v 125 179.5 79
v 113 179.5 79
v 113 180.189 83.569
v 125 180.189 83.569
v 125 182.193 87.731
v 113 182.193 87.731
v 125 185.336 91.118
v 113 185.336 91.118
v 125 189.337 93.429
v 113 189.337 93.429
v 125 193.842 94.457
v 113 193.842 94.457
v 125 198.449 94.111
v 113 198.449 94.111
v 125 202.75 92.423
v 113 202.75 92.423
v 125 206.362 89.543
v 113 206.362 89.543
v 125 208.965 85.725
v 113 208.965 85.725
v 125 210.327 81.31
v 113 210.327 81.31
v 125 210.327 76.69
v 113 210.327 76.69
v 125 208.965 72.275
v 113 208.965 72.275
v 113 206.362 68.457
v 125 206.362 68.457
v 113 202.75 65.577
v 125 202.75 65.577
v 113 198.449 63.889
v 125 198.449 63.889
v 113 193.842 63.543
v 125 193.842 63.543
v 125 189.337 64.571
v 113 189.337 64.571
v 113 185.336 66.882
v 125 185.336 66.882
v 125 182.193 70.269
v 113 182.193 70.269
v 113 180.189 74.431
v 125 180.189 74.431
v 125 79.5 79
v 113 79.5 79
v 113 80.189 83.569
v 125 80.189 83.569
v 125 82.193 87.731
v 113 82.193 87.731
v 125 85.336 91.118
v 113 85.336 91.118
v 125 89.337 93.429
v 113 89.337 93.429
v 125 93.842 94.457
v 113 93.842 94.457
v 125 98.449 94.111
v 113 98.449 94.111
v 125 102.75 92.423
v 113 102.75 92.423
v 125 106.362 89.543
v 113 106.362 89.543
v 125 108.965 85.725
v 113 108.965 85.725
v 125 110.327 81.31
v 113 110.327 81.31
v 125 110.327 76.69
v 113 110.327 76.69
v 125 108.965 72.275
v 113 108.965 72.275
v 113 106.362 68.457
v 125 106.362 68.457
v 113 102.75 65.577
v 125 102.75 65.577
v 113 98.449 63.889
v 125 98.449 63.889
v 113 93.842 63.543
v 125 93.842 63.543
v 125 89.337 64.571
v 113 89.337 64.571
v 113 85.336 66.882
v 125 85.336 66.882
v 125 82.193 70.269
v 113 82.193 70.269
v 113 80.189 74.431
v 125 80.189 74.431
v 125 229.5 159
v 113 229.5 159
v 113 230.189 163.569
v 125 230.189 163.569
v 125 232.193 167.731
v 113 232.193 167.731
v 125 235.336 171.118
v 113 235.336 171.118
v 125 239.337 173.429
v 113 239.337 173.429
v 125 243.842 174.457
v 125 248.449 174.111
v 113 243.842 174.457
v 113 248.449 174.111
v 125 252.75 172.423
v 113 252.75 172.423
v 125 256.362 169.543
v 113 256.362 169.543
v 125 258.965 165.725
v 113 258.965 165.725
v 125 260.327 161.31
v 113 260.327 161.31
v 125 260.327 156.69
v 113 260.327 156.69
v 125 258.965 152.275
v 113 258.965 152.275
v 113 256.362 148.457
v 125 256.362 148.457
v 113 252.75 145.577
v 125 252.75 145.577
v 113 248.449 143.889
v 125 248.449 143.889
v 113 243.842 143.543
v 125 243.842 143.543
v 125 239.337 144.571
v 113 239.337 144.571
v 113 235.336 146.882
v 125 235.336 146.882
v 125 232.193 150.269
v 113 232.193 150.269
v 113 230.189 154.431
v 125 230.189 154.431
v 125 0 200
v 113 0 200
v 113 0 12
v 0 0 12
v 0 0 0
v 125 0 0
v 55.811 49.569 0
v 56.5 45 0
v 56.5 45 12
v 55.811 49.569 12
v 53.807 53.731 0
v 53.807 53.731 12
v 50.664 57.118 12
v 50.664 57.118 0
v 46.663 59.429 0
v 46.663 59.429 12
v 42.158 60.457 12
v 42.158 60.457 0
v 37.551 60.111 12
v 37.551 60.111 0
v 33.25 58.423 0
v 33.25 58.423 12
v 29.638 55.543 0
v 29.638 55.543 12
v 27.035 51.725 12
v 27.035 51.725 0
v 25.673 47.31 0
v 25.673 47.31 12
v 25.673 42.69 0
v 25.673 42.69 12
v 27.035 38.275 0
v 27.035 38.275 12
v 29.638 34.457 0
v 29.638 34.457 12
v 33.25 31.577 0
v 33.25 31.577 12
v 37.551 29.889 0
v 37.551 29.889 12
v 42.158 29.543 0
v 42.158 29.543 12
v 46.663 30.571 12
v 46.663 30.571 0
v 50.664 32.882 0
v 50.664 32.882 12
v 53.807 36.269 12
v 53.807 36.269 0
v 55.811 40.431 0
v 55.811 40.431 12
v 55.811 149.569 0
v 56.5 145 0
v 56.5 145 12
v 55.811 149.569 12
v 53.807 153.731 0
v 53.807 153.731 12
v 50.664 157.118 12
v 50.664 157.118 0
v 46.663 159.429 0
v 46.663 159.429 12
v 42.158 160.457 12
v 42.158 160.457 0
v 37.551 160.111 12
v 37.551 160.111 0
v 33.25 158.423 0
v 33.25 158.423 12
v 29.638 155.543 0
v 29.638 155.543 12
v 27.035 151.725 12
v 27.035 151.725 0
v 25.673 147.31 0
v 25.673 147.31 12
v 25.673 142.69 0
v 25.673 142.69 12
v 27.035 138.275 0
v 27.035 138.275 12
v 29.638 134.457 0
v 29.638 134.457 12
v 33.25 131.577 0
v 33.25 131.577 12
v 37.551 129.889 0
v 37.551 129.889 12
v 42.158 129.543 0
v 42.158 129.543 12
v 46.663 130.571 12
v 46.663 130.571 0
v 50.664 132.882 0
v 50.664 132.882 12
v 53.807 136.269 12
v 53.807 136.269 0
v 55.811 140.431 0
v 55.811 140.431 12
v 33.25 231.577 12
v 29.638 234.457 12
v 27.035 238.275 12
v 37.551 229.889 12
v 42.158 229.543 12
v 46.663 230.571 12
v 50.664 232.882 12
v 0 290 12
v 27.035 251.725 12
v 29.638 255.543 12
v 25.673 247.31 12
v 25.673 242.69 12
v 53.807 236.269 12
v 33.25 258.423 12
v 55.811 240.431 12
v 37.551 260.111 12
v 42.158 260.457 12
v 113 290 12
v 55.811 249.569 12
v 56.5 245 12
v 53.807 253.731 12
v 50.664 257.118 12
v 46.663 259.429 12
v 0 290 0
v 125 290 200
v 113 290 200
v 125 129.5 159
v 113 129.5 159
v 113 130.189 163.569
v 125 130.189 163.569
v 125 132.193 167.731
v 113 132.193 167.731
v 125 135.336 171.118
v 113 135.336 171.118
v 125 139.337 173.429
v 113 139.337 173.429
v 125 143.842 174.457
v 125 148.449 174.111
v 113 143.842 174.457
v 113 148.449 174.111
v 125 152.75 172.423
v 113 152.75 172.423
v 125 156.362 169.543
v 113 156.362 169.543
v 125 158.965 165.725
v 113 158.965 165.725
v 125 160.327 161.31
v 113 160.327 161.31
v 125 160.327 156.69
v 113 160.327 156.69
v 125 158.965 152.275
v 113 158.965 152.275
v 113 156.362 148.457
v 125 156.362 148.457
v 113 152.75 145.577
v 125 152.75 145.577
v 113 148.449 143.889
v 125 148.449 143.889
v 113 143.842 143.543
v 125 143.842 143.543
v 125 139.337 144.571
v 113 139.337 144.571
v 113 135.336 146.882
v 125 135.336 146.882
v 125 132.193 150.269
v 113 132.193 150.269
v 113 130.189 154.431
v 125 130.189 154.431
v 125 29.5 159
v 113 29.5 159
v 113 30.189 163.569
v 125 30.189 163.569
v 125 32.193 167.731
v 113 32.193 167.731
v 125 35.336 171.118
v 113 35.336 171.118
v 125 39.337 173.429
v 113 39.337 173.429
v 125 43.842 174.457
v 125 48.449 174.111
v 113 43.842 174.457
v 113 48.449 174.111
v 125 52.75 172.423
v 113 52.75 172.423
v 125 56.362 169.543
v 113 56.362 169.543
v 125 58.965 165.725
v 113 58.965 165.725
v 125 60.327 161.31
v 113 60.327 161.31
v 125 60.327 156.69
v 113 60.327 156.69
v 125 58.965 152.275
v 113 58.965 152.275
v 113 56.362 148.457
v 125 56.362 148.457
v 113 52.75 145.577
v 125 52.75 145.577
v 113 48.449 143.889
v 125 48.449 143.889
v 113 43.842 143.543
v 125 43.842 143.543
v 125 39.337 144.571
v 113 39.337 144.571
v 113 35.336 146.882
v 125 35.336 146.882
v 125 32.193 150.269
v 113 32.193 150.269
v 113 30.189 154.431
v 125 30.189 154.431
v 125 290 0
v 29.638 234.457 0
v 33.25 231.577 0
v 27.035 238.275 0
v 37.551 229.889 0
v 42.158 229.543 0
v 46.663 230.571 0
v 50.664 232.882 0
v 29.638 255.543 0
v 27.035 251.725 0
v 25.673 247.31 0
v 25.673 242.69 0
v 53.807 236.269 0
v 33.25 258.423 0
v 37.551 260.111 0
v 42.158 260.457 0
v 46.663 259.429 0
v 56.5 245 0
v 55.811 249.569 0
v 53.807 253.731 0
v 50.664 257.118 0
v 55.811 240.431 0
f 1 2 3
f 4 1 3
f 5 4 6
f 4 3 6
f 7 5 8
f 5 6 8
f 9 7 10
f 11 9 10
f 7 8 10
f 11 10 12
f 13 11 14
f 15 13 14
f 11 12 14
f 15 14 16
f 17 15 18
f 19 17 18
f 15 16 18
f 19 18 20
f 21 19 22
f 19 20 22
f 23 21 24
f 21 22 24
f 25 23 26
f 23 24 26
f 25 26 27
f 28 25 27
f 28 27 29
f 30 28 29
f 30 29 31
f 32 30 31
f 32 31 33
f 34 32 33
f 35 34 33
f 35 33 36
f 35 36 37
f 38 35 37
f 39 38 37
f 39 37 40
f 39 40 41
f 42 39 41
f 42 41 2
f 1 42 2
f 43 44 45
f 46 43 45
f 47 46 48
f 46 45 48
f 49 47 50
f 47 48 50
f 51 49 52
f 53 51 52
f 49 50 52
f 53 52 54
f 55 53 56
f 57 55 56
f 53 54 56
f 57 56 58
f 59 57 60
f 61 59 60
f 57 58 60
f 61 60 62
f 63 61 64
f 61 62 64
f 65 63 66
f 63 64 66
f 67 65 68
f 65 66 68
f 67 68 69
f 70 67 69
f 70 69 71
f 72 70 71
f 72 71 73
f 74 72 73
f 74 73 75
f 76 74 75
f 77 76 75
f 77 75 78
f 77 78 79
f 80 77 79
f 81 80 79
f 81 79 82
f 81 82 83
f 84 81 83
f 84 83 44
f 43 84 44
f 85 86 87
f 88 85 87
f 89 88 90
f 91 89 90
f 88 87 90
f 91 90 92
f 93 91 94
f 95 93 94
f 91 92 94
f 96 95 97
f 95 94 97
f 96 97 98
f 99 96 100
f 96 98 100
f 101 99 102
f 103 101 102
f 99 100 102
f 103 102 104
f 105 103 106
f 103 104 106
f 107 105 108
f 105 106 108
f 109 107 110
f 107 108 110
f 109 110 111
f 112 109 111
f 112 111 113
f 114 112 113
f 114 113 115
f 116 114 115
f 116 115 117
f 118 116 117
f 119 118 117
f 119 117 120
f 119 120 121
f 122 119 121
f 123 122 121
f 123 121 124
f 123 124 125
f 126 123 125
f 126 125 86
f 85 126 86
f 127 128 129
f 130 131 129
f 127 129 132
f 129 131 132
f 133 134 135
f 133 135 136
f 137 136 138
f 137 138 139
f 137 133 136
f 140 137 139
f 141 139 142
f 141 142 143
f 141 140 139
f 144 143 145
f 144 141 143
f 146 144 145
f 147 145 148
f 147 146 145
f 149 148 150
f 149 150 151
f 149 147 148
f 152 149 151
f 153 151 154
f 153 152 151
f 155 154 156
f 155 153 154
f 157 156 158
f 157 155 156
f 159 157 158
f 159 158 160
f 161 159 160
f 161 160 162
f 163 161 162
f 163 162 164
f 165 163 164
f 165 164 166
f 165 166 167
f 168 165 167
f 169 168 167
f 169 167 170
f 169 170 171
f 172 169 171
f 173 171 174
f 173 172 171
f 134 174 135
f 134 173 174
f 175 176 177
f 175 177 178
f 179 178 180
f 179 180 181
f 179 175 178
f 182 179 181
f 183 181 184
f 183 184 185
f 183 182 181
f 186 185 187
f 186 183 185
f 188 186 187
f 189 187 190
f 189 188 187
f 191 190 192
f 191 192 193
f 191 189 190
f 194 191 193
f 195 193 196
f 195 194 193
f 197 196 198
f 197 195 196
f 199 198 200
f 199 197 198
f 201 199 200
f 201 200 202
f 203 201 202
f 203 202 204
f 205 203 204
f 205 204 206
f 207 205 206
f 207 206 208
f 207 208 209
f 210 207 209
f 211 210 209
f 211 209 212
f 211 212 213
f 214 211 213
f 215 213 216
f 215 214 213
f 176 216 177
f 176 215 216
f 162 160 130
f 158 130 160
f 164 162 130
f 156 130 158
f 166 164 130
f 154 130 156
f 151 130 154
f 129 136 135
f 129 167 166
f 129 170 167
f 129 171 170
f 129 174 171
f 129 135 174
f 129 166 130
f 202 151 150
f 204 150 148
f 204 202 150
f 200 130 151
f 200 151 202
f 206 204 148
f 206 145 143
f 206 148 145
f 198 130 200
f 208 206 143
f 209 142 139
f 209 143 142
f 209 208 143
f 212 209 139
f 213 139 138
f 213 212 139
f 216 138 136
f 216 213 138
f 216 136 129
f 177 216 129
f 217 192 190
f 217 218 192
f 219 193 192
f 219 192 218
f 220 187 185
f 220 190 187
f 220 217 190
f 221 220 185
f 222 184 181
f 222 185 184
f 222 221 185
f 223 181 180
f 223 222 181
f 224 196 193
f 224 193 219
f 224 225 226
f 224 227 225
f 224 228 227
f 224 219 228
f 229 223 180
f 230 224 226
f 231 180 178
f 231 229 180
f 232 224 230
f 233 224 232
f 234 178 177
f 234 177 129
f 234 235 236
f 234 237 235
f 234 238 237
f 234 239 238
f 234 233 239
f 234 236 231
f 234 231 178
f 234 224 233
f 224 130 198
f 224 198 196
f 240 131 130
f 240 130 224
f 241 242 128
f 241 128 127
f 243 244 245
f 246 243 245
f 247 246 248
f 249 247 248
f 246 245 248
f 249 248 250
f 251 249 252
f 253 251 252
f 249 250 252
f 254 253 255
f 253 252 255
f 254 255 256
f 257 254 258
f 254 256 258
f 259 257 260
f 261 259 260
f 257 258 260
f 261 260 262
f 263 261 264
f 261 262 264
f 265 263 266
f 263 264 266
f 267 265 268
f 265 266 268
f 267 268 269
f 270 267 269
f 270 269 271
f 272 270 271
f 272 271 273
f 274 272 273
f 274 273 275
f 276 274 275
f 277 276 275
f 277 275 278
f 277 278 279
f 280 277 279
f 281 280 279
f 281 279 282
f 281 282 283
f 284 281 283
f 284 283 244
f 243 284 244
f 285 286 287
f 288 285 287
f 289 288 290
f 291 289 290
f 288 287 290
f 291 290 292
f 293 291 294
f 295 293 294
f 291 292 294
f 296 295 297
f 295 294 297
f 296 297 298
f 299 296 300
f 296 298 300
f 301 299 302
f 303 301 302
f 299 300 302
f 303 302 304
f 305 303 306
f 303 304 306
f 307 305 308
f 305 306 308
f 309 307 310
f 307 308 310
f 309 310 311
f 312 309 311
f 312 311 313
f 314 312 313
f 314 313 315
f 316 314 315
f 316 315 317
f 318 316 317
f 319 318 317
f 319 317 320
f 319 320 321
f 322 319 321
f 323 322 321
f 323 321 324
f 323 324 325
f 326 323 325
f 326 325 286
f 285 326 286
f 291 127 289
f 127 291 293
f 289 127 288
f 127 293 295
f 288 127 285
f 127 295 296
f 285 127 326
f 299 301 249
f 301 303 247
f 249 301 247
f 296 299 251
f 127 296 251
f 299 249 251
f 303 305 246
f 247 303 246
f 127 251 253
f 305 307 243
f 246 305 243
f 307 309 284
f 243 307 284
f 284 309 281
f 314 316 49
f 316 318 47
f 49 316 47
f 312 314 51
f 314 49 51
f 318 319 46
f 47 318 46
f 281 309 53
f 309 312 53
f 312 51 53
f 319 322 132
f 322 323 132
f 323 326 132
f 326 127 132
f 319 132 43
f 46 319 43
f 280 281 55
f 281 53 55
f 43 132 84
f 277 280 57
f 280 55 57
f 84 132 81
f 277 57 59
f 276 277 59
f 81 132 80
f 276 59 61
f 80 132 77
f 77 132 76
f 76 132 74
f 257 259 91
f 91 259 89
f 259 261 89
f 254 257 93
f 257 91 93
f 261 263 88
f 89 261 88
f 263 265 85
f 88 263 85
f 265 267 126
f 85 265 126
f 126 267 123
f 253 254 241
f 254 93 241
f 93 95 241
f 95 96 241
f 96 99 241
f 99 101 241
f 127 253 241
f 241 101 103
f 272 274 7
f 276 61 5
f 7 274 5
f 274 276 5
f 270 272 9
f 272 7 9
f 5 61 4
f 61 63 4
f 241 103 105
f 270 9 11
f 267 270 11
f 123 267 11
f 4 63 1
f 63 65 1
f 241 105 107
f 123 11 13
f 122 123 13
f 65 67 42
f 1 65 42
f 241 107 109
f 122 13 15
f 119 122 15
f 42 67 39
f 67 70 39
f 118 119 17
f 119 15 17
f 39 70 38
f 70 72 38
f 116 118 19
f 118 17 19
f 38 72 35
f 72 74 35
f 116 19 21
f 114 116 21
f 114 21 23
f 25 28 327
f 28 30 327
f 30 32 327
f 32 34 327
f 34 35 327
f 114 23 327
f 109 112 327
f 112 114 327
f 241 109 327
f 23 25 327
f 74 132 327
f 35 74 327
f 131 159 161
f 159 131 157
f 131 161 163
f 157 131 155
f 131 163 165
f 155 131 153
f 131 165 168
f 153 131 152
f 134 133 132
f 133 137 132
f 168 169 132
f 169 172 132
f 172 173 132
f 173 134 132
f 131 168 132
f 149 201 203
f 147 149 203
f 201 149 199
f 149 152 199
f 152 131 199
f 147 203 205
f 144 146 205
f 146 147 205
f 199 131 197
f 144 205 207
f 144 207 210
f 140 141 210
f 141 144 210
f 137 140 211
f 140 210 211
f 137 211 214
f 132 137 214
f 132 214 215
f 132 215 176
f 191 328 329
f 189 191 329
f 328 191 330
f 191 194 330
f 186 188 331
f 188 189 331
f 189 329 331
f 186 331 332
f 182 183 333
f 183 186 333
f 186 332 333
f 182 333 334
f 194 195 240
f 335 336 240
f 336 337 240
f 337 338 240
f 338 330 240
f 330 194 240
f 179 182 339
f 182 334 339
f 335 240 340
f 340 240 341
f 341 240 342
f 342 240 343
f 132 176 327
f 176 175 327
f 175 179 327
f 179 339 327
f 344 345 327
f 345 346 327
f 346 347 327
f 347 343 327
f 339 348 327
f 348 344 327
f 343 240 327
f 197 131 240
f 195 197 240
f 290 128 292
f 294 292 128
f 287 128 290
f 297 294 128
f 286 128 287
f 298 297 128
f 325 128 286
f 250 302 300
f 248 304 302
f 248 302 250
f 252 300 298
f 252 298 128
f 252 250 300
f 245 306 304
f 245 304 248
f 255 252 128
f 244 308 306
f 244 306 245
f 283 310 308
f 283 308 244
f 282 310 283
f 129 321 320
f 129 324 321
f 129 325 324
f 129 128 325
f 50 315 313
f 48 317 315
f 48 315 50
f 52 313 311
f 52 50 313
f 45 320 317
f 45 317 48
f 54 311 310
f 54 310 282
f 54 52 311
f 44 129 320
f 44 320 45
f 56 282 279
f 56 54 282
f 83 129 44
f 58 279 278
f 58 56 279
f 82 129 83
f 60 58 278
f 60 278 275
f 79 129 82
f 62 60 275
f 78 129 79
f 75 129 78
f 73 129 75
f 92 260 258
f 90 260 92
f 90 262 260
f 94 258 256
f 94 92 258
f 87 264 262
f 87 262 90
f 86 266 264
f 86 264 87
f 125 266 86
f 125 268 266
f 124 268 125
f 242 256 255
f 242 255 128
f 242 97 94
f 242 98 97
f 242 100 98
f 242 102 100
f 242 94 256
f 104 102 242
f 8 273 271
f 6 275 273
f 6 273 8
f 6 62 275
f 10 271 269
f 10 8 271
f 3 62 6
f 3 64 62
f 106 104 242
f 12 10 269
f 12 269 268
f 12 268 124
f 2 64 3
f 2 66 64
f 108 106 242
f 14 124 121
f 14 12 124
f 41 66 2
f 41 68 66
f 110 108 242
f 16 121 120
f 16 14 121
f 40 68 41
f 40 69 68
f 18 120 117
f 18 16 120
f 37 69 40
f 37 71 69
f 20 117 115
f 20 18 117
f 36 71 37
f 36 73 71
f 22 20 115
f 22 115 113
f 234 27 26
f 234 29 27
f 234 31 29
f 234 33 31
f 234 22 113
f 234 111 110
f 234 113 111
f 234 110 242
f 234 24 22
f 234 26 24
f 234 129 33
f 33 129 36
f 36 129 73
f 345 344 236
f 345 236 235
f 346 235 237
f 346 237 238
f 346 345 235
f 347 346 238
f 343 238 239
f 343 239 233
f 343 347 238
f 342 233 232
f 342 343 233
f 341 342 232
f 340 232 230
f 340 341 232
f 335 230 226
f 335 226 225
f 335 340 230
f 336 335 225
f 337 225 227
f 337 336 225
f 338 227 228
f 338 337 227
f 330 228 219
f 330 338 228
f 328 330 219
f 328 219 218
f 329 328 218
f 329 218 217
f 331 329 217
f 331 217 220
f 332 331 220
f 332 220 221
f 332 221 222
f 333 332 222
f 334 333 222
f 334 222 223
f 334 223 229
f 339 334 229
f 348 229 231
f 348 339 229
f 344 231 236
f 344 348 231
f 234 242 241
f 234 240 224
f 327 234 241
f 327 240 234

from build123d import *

# Parameters (mm, degrees)
SKETCH1_W      = 125
SKETCH1_H      = 290
SKETCH1_R      = 15.5
EXTRUDE1_DEPTH = 12
SKETCH2_W      = 12
SKETCH2_H      = 290
EXTRUDE2_DEPTH = 188
SKETCH3_R      = 15.5
EXTRUDE3_DEPTH = 188


with BuildPart() as part:
    # Sketch1 → Extrude1 (new body)
    with BuildSketch(Plane.XY):
        with Locations((62.5, 145)):
            Rectangle(SKETCH1_W, SKETCH1_H)
        with Locations((41, 45)):
            Circle(SKETCH1_R, mode=Mode.SUBTRACT)
        with Locations((41, 145)):
            Circle(SKETCH1_R, mode=Mode.SUBTRACT)
        with Locations((41, 245)):
            Circle(SKETCH1_R, mode=Mode.SUBTRACT)
    extrude(amount=EXTRUDE1_DEPTH)

    # Sketch2 → Extrude2 (add)
    with BuildSketch(Plane.XY.offset(12)):
        with Locations((119, 145)):
            Rectangle(SKETCH2_W, SKETCH2_H)
    extrude(amount=EXTRUDE2_DEPTH)

    # Sketch3 → Extrude3 (cut)
    with BuildSketch(Plane.ZY.offset(-113)):
        with Locations(Location((159, 45, 0), (0, 0, 270))):
            Circle(SKETCH3_R)
        with Locations(Location((159, 145, 0), (0, 0, 270))):
            Circle(SKETCH3_R)
        with Locations(Location((159, 245, 0), (0, 0, 270))):
            Circle(SKETCH3_R)
        with Locations(Location((79, 95, 0), (0, 0, 270))):
            Circle(SKETCH3_R)
        with Locations(Location((79, 195, 0), (0, 0, 270))):
            Circle(SKETCH3_R)
    extrude(amount=-EXTRUDE3_DEPTH, mode=Mode.SUBTRACT)


solid = part.part
